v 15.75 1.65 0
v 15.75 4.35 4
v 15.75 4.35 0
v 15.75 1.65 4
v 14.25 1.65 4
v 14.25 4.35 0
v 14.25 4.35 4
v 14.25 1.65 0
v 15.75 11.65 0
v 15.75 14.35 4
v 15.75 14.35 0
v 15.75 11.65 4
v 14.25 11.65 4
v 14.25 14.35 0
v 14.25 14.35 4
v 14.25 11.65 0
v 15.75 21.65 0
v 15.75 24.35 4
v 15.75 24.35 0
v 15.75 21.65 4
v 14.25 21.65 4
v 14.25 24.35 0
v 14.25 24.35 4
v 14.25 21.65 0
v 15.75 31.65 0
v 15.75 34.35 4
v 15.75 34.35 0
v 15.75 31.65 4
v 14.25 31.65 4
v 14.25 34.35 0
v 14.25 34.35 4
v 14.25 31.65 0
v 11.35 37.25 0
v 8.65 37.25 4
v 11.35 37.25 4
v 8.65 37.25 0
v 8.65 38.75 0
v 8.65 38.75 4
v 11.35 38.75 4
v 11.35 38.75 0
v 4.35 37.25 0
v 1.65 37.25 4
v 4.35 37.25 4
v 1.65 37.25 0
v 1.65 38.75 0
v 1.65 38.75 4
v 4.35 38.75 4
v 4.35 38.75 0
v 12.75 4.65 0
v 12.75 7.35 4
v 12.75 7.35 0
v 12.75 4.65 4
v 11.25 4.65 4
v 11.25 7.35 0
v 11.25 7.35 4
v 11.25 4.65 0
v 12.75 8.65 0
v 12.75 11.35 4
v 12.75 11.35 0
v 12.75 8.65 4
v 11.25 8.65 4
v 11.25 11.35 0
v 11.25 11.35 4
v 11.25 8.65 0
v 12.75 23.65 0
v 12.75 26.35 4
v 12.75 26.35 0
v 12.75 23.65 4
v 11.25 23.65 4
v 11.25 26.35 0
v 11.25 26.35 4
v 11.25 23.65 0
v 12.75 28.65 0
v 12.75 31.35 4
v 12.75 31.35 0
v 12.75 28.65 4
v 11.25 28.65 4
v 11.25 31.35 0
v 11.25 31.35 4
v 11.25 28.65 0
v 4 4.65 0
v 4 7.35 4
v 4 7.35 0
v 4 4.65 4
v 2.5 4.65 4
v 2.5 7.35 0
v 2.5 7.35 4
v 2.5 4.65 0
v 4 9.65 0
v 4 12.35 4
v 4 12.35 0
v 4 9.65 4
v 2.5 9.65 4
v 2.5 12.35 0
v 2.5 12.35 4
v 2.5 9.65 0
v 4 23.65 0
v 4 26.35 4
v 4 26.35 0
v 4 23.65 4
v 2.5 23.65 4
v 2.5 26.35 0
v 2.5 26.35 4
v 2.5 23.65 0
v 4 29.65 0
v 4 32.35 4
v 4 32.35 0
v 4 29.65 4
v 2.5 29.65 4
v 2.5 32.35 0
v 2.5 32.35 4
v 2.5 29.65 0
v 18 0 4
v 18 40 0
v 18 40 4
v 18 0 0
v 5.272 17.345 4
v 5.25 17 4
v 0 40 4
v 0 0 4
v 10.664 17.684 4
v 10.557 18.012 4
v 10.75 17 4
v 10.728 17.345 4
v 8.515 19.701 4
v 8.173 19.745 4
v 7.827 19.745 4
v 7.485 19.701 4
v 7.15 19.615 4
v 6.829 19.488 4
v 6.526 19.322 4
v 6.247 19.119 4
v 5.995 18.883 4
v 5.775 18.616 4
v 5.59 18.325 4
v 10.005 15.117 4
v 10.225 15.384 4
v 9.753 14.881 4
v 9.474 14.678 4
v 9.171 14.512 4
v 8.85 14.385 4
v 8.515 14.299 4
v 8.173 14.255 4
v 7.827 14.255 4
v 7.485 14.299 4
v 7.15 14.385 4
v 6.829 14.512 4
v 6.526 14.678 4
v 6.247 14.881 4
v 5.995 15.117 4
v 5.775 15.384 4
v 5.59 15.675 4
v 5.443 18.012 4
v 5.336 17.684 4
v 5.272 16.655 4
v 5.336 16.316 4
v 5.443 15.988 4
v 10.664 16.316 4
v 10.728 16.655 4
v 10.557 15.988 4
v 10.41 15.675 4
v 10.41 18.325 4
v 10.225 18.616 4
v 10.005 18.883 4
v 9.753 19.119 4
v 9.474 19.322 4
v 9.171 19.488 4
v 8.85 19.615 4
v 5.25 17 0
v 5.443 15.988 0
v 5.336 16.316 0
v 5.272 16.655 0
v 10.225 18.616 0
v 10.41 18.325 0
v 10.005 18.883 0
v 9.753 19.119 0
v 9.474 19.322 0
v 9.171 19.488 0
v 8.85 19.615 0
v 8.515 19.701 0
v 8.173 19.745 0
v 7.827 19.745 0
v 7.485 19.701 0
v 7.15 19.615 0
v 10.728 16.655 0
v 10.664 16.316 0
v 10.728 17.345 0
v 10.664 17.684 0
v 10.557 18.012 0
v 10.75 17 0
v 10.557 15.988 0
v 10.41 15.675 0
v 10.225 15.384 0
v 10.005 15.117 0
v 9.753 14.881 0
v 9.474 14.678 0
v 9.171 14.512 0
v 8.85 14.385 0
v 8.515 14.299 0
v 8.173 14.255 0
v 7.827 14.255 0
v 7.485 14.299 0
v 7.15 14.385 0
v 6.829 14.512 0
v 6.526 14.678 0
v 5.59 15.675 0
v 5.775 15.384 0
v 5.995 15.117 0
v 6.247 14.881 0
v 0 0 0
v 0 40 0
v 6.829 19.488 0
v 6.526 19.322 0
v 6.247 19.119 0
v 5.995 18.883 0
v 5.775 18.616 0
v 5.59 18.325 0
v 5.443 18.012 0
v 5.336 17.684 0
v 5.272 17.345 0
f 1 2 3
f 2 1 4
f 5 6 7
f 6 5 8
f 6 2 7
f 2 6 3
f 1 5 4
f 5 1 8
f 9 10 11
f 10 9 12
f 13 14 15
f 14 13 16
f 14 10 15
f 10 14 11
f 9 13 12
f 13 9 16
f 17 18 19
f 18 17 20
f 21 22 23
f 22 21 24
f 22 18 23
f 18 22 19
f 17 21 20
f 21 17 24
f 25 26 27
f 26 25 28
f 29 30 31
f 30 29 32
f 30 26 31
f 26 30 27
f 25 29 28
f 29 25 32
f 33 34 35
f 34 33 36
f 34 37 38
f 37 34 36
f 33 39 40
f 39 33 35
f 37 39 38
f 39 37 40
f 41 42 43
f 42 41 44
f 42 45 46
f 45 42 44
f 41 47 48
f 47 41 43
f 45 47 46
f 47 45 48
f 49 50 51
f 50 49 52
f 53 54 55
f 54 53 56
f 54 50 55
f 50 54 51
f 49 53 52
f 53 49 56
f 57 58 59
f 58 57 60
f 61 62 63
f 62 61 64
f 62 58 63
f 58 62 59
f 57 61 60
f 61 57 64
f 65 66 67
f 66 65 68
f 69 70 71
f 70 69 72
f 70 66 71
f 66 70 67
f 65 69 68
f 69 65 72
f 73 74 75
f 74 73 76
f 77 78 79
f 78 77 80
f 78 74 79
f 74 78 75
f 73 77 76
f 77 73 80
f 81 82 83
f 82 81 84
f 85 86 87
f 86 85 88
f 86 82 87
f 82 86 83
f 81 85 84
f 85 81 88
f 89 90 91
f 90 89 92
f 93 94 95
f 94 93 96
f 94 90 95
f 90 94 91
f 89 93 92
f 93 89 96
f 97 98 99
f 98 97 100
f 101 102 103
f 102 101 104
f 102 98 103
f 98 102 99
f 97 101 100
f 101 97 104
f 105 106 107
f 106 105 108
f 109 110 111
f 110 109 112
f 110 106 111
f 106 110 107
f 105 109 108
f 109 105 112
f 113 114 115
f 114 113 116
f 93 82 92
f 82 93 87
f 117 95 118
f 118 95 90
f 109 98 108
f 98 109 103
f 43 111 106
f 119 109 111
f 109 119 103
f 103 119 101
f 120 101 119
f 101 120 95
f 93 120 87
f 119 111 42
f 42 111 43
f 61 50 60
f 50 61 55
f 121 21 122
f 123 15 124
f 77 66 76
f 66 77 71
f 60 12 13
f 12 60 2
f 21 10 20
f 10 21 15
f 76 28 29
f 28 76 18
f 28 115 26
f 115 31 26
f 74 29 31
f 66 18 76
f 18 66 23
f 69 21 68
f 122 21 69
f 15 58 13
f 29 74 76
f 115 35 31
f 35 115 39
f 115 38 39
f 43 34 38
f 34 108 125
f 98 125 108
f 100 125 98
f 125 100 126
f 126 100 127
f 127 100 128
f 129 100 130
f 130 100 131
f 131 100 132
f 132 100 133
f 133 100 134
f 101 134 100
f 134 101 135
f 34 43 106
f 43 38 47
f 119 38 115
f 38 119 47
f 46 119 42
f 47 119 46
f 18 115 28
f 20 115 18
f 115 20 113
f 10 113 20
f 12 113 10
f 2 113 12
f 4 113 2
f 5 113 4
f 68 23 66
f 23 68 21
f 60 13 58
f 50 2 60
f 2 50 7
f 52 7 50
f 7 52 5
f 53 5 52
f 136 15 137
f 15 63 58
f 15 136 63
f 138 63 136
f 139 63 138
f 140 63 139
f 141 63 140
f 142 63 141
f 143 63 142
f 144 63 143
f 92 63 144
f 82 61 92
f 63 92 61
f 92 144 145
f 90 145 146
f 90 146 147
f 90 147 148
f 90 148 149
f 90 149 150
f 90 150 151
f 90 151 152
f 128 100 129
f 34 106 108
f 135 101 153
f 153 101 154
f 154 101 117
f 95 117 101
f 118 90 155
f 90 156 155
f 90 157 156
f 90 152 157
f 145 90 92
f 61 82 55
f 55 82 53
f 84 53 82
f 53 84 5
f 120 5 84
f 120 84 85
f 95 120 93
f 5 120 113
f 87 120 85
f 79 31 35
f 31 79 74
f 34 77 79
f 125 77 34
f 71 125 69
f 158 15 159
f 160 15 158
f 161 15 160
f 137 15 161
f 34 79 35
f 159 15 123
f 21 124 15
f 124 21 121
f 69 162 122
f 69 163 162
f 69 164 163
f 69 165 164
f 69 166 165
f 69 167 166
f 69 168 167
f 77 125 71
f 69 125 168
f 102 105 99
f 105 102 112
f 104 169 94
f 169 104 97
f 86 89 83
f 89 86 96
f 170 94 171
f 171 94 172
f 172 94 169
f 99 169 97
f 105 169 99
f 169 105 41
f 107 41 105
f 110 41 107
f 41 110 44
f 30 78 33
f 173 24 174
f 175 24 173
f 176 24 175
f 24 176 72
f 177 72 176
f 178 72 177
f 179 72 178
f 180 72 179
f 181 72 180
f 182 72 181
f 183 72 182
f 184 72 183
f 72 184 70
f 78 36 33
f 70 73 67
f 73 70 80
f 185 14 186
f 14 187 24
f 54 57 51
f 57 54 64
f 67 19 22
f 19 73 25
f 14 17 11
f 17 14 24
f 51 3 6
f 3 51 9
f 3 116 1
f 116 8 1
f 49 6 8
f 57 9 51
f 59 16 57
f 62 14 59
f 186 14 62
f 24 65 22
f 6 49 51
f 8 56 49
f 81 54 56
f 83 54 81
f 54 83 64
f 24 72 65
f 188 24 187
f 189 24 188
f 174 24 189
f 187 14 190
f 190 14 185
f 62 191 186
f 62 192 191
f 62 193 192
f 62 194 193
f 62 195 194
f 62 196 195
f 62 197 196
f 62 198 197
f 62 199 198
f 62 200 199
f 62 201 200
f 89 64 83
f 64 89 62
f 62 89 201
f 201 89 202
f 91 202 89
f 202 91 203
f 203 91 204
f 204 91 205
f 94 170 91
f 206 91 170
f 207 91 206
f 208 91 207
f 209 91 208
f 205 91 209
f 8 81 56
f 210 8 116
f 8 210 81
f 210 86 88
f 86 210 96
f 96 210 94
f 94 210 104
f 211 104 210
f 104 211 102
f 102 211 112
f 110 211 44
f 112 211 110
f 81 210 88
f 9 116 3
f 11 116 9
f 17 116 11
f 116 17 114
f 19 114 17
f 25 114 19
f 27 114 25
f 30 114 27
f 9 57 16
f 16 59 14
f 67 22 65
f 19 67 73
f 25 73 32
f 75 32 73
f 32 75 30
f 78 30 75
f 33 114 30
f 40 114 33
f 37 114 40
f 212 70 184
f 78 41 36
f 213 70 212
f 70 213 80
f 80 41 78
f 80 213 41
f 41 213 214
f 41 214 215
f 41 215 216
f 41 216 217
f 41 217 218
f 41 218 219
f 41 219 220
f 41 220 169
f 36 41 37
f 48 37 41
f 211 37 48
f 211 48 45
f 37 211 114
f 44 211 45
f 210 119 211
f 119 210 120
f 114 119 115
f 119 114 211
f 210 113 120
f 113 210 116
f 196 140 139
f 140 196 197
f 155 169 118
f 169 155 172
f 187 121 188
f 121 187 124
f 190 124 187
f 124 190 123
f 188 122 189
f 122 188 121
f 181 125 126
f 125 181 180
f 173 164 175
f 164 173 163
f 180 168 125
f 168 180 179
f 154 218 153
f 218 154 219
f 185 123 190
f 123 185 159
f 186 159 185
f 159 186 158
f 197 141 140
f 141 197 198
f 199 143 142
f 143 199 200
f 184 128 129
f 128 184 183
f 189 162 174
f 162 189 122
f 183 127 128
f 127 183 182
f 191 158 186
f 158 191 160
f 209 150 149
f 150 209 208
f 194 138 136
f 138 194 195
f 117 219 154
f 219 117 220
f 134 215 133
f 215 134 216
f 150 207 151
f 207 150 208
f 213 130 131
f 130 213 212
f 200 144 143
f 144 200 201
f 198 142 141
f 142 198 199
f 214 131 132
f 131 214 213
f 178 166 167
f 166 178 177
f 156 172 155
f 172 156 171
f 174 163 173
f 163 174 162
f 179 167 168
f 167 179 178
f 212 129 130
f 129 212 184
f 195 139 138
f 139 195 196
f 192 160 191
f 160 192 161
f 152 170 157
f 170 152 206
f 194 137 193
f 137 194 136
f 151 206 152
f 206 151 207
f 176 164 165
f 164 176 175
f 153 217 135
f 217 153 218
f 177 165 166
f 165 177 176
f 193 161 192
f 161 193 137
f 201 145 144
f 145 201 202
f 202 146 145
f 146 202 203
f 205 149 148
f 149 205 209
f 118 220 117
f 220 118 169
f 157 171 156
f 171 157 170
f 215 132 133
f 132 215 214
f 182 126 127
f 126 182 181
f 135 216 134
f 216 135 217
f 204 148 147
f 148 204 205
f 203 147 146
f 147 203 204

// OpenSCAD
//https://github.com/EricRohlfs/UltrasonicStriker
//numbers are in mm

// Part 1 of 2 for SG90 servo powered foosball gripper
// A coat hanger is bent into two different arms
// and attached via zip ties
$fn=50;
servoHornLength = 34; //adjust if you have different horn size

hornStrapWidth = 1.5; // adjust if zip ties don't fit
hornStrapDepth = 2.7; //adjust if zip ties groves need to be deeper

//Tweak these numbers if necessary, the largest positive number is closest to coat hanger hole
servoHornZipTieChannelPlacement= [-9, -3.5, 2.75, 6.25];

coatHangerDiameterActual =2;
coatHangerDiameter = coatHangerDiameterActual +.25;
coatHangerChannel = coatHangerDiameter;
coatHangerHole = coatHangerChannel +.65;

sg90Margin = .1; //cause the hole needs to be a tad bigger than the object
sg90StickerAdjustment = .2;//stickers were getting ripped off because it was too tight
sg90Width = 12.3 + sg90Margin + sg90StickerAdjustment;
sg90Depth = 22.8 + sg90Margin;
sg90Height = 26.5; //must be greater that base_h

sg90CavityBack = -sg90Width/2; //back edge reference point for the arm and zip ties
sg90CavityBackZip = sg90CavityBack - hornStrapWidth;

//main block
base_h = 9.15;  //height
base_w = sg90Width + 10; // width
base_d = sg90Depth + 14; //46 is original; //depth

//was 7 - hornStrap, not sure why I couldn't get exact width, so just added the last number
armMountWidth = base_w/2 - sg90Width/2 - hornStrapWidth +2.75;
armMountHeight = 20;
armMountY = base_d/2 + 6;
armMountTY = -armMountY -1.5;
armTransX = sg90CavityBack -.9;

//servo horn set screw
setScrewHoleRadius = 2;//make this bigger if yor screwdrive does not fit

//The big hole in the midddle of the piece
servoCavityCenterOffset = 7;
servoCavityX = (base_w - sg90Width - servoCavityCenterOffset);
servoCavityY = 0;
     

module ZipTieHole (){
  rotate([0,0,0]) cube([hornStrapWidth, hornStrapDepth, base_h +.1],center=true);
 }
 
 
x=18;
y=40;
z= 4;
difference (){
   
  
    
    cube([x,y,z]);
    screwHoleSize = 5.5;
    hornCenterX = (x/2) - (screwHoleSize/2)- (coatHangerDiameterActual/2) ;//-(9.75);//7.8
    //servohorn set screw
    translate([hornCenterX +screwHoleSize/2 ,17,-.1])cylinder(d=screwHoleSize, h= z+.5);
    count = 4;
    //coat hanger side
    coatLongX = x-3;
    for (i=[0:count]){
        yy = 3 + (y/count) * i;
        translate([coatLongX,yy,-.1]) ZipTieHole();
        } 
        
    //back two    
    for (i=[0:1]){
        yy = (7  * i);
        rotate([0,0,90])translate([y-2, yy-10,-.1]) ZipTieHole();
    }  


   //from left horn
    translate([coatLongX - 3, 6,-.1]) {
        ZipTieHole();
        translate([0,4,0]) ZipTieHole();
    }
    
    //back left horn
    translate([coatLongX - 3, 25,-.1]) {
        ZipTieHole();
        translate([0,5,0]) ZipTieHole();
    }
    
    //front right horn
    translate([hornCenterX -2 , 6,-.1]) {
        ZipTieHole();
        translate([0,5,0]) ZipTieHole();
    }
    //back right horn
    translate([hornCenterX -2, 25,-.1]) {
        ZipTieHole();
        translate([0,6,0]) ZipTieHole();
    }
}
   
